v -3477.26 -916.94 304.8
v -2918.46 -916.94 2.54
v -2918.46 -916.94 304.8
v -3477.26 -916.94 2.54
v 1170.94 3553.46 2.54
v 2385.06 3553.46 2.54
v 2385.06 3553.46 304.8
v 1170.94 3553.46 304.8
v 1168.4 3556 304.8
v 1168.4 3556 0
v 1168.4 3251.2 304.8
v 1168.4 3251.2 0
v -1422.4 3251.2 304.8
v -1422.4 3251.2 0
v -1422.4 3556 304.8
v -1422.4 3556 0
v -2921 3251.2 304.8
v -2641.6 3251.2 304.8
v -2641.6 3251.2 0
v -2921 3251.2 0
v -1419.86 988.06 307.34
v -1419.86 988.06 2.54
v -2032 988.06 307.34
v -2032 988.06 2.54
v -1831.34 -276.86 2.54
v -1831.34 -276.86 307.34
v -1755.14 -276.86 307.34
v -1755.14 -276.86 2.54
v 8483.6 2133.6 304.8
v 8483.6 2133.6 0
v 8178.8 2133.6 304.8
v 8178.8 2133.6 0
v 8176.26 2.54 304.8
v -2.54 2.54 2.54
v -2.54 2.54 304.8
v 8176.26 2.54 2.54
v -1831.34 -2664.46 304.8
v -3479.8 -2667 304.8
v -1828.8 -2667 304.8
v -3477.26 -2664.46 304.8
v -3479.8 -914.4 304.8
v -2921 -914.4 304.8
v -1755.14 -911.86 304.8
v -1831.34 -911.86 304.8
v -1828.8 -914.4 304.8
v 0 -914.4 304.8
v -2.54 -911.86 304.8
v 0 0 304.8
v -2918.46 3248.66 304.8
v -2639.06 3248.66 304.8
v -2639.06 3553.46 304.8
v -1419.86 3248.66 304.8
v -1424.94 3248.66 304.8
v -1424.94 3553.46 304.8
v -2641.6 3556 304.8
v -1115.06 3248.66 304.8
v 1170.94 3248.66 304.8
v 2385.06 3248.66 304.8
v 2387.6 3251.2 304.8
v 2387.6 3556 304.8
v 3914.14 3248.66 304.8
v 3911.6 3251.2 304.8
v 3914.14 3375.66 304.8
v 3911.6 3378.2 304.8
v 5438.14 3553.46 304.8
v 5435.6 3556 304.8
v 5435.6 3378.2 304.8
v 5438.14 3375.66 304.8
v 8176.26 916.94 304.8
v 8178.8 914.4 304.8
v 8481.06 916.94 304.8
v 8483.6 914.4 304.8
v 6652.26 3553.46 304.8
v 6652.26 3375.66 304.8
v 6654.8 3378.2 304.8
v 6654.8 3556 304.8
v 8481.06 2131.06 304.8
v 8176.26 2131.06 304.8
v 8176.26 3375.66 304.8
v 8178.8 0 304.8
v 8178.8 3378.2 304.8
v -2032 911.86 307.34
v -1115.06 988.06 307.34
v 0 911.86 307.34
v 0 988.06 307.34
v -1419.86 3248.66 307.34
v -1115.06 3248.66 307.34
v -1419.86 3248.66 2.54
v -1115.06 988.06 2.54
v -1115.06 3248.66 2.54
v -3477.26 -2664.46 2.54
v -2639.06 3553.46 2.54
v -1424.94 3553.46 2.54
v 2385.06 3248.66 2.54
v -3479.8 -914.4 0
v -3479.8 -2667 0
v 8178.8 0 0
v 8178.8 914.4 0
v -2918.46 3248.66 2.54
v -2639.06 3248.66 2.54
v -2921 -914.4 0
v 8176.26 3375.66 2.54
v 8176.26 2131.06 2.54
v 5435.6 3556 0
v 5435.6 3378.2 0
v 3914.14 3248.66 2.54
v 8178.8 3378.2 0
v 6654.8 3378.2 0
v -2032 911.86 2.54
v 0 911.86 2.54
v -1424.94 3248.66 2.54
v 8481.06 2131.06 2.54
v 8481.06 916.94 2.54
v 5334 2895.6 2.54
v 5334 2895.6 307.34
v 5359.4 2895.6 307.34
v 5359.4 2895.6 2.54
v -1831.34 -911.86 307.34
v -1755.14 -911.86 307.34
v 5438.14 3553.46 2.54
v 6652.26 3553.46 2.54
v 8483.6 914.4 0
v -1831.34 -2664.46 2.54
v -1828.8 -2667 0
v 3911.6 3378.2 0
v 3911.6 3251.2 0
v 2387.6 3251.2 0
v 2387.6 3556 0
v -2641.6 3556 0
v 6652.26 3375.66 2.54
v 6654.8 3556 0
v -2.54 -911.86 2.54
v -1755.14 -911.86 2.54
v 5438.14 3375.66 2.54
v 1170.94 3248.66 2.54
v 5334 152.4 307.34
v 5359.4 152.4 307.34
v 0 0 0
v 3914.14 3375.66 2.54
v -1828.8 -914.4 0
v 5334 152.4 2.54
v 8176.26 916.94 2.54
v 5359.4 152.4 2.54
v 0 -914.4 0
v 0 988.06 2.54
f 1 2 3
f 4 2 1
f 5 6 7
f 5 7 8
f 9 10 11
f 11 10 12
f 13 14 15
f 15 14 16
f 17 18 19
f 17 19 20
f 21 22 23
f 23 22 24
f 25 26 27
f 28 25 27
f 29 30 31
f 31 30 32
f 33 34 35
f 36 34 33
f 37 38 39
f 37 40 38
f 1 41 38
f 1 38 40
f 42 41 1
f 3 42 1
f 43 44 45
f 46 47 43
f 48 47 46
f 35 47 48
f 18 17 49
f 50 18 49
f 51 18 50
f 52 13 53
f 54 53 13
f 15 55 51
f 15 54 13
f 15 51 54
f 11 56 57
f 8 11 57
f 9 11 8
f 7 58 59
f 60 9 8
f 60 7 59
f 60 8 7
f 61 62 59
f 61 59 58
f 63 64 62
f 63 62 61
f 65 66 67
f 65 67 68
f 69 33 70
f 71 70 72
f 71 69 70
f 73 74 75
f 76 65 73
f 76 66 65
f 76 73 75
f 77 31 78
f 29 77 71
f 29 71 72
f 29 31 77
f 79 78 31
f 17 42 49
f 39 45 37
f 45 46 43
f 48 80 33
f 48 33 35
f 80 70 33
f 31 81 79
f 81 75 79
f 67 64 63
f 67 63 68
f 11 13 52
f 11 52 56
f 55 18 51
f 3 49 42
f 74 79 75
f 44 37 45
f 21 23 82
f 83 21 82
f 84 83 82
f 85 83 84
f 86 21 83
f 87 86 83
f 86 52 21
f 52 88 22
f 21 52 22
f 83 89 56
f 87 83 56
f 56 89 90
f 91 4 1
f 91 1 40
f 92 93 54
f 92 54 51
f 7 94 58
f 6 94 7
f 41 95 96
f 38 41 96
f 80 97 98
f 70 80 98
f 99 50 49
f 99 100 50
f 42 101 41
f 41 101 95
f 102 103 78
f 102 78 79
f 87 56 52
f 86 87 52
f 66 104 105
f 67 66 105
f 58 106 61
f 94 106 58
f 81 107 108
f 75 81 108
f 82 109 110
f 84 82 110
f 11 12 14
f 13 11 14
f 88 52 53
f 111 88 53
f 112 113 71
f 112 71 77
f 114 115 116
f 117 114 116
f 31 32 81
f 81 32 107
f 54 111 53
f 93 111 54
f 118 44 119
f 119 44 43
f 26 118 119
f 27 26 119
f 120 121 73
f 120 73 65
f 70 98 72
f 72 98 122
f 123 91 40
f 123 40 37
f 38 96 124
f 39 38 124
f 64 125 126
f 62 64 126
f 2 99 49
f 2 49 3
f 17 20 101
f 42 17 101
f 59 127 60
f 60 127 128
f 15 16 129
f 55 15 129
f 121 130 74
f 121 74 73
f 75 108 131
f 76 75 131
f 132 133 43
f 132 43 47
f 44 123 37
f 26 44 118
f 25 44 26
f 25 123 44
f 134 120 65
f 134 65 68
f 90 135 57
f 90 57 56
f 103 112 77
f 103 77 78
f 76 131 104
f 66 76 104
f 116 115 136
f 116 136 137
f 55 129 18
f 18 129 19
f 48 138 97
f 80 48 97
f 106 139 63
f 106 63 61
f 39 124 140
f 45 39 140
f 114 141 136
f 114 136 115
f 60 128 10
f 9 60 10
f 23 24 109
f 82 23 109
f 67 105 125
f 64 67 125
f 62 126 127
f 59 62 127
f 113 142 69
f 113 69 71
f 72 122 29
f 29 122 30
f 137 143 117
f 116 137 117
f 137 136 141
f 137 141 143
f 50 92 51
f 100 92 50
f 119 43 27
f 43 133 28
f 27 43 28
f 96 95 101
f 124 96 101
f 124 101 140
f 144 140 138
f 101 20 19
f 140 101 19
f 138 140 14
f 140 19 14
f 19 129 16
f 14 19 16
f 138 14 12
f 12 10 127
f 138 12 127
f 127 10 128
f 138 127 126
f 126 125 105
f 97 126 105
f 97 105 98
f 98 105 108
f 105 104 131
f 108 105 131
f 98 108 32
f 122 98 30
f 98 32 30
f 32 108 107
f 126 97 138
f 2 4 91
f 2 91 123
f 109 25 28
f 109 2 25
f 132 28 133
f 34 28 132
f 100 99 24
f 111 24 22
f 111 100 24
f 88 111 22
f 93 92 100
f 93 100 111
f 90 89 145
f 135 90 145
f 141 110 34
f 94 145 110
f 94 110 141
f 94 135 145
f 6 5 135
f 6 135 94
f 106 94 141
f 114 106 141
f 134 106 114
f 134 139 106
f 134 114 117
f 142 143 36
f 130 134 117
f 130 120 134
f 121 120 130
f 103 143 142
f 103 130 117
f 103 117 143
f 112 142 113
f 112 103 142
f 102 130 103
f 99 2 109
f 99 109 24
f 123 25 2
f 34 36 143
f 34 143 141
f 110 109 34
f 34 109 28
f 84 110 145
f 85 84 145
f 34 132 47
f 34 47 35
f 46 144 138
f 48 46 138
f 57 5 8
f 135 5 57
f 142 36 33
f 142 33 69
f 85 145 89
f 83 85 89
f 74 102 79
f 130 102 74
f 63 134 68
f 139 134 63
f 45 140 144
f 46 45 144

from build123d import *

# Parameters (mm, degrees)
F1_DEPTH = 304.8
F2_T     = -2.54
F4_DEPTH = 304.8
F5_W     = 76.2
F5_H     = 635
F6_DEPTH = 304.8
F7_W     = 25.4
F7_H     = 2743.2
F8_DEPTH = 304.8


with BuildPart() as f1:
    # F0 (on Top) → F1 (new body)
    with BuildSketch(Plane.XY):
        Polygon((-2921, 3251.2), (-2921, -914.4), (-3479.8, -914.4), (-3479.8, -2667), (-1828.8, -2667), (-1828.8, -914.4), (0, -914.4), (0, 0), (8178.8, 0), (8178.8, 914.4), (8483.6, 914.4), (8483.6, 2133.6), (8178.8, 2133.6), (8178.8, 3378.2), (6654.8, 3378.2), (6654.8, 3556), (5435.6, 3556), (5435.6, 3378.2), (3911.6, 3378.2), (3911.6, 3251.2), (2387.6, 3251.2), (2387.6, 3556), (1168.4, 3556), (1168.4, 3251.2), (-1422.4, 3251.2), (-1422.4, 3556), (-2641.6, 3556), (-2641.6, 3251.2), align=None)
    extrude(amount=F1_DEPTH)

    # F2
    f2_openings = [f1.faces().sort_by_distance(p)[0] for p in [
        (2087.908802, 1330.371732, 304.8),
    ]]
    offset(amount=F2_T, openings=f2_openings, kind=Kind.INTERSECTION)

    # F3 (on face) → F4 (join)
    with BuildSketch(Plane.XY.offset(2.54)):
        Polygon((-1115.06, 3248.66), (-1419.86, 3248.66), (-1419.86, 988.06), (-2032, 988.06), (-2032, 911.86), (0, 911.86), (0, 988.06), (-1115.06, 988.06), align=None)
    extrude(amount=F4_DEPTH)

    # F5 (on face) → F6 (join)
    with BuildSketch(Plane.XY.offset(2.54)):
        with Locations((-1793.24, -594.36)):
            Rectangle(F5_W, F5_H)
    extrude(amount=F6_DEPTH)

    # F7 (on face) → F8 (join)
    with BuildSketch(Plane.XY.offset(2.54)):
        with Locations((5346.7, 1524)):
            Rectangle(F7_W, F7_H)
    extrude(amount=F8_DEPTH)


solid = f1.part
